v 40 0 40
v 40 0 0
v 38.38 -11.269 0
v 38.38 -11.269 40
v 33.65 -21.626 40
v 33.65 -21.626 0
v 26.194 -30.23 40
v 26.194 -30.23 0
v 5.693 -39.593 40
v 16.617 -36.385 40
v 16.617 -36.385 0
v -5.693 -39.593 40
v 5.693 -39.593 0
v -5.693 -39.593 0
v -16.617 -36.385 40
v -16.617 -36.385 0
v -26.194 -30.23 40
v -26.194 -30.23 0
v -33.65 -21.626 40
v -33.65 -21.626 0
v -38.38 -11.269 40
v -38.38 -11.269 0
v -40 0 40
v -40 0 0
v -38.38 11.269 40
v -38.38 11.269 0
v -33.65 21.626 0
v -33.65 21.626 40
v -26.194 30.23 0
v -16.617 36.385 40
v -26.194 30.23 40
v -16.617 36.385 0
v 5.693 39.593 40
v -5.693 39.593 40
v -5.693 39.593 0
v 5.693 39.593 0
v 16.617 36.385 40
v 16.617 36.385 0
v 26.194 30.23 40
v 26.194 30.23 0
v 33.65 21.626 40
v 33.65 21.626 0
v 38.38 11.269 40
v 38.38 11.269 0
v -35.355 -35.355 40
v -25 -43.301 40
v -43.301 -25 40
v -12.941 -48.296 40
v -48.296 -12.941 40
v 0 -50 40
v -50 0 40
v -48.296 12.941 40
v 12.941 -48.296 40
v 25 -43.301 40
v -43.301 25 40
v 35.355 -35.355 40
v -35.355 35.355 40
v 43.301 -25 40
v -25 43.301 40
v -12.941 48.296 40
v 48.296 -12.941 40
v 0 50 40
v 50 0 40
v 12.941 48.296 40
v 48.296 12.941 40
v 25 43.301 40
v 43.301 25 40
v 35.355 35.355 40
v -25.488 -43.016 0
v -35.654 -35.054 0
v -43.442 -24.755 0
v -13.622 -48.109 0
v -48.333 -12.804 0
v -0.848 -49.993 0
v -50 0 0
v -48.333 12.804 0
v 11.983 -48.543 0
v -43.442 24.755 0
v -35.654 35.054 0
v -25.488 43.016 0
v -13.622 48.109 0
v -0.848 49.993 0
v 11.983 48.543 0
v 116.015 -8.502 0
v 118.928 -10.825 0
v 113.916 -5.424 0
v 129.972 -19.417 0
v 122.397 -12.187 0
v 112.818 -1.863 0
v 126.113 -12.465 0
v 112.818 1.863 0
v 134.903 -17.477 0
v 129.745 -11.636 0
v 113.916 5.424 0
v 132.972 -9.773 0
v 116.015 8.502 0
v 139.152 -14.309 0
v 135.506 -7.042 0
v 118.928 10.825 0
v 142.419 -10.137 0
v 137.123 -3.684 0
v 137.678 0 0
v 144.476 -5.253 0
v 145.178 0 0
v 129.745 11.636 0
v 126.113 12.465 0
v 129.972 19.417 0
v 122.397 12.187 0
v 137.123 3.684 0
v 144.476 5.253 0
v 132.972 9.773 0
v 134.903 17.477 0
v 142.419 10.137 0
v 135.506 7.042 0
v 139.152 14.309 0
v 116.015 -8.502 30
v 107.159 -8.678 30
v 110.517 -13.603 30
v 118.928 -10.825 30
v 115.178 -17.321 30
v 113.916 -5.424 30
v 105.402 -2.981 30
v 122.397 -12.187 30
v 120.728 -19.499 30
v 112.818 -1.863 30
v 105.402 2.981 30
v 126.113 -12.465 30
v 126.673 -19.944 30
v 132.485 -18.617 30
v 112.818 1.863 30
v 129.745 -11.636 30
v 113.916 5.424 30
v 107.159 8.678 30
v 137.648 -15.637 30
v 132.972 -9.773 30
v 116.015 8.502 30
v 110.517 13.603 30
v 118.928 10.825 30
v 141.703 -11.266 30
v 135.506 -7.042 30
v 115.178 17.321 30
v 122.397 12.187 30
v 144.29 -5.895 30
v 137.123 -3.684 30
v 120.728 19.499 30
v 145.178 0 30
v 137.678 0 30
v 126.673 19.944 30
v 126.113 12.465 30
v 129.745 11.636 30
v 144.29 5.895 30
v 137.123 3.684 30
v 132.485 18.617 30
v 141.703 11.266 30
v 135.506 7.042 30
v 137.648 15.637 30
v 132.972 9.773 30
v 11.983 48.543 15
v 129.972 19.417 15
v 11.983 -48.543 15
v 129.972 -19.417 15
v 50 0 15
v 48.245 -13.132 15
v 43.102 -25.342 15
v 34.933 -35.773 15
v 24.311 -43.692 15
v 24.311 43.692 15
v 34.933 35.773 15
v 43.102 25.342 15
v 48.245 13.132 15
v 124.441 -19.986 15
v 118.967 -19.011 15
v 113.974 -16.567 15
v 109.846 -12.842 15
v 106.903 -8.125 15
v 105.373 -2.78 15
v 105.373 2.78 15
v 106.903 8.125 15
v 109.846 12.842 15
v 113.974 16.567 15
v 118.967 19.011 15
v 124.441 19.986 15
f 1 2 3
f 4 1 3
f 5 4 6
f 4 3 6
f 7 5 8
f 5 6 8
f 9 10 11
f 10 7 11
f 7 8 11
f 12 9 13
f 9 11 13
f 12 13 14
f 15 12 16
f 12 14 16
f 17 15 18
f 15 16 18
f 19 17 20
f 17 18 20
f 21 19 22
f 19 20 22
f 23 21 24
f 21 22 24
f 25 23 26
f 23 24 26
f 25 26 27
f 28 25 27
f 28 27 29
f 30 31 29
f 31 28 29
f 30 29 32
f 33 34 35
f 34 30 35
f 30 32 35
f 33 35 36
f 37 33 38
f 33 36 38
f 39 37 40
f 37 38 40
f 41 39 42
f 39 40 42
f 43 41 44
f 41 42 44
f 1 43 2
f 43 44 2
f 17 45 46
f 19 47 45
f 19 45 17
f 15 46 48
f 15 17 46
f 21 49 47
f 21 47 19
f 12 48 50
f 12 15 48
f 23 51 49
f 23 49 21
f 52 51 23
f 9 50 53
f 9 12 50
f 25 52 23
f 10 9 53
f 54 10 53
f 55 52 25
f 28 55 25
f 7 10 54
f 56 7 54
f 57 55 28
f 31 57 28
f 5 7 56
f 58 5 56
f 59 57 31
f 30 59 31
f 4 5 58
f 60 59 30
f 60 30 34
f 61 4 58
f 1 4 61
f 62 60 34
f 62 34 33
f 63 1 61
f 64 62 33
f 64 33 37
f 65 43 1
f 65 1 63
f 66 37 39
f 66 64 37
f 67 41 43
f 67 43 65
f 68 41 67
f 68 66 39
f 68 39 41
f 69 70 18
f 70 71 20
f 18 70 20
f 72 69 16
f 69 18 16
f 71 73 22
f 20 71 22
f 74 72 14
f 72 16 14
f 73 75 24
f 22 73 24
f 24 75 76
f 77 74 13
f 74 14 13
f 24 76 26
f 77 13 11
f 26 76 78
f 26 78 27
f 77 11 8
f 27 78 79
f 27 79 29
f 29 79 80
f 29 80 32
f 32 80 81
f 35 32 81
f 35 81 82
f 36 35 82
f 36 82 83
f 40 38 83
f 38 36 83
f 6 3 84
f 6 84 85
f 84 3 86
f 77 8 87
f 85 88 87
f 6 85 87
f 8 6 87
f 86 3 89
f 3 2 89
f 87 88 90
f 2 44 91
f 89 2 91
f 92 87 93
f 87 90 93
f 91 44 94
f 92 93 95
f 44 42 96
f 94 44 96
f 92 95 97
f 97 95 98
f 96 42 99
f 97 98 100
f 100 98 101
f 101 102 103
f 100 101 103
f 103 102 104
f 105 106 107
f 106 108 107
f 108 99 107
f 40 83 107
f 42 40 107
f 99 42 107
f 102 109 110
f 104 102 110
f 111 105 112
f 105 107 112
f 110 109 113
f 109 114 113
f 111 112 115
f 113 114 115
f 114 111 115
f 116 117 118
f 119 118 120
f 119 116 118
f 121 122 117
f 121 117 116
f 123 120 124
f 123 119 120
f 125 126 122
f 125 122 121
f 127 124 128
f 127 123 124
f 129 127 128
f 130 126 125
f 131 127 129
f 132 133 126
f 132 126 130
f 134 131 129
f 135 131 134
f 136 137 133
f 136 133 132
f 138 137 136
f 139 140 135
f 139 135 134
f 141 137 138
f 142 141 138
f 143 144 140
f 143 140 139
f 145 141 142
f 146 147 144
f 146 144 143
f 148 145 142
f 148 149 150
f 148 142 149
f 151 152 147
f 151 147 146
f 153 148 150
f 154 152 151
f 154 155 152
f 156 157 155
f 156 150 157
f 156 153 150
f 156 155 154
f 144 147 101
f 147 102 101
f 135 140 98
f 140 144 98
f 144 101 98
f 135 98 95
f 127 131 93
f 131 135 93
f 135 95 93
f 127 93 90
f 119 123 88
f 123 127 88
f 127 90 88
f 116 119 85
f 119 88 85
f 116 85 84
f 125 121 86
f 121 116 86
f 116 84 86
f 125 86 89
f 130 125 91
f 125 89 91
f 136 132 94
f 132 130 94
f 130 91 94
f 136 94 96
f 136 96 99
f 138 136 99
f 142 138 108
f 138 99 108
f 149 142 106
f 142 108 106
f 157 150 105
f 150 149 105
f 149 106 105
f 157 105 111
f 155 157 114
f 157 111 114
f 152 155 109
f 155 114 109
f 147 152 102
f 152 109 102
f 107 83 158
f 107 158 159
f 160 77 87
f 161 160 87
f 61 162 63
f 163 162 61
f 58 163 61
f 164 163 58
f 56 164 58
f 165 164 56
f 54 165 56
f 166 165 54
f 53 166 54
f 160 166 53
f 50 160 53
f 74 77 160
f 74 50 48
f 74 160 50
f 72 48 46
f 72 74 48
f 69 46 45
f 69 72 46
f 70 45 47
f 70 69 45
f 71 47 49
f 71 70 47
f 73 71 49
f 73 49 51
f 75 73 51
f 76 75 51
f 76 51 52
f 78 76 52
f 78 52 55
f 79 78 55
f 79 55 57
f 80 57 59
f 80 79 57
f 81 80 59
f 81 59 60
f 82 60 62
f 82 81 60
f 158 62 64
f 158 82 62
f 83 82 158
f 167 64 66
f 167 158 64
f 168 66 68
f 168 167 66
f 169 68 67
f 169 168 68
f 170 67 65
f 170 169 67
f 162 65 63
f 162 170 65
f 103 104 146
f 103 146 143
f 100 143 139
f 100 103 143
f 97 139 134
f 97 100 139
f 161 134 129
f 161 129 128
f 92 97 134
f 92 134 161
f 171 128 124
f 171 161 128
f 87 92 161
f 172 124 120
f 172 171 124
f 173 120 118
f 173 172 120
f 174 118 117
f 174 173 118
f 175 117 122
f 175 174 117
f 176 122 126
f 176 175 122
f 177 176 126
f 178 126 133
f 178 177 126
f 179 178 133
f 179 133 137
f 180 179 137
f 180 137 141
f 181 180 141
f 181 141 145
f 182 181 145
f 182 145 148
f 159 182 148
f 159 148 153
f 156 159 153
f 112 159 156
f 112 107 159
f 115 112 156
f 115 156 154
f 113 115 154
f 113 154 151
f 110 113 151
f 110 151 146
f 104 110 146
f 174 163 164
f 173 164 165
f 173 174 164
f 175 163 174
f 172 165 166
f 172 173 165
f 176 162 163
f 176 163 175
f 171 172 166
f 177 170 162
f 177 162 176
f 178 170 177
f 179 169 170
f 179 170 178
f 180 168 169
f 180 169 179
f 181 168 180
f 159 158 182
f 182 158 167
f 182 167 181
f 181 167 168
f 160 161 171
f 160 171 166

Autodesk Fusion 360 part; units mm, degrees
sketch "스케치1" plane through (0, 0, 0) normal (0, 0, 1) x (1, 0, 0)
  circle A0 centre (0, 0) radius 50
  circle A1 centre (125.1784, 0) radius 20
  line L0 (11.9829, 48.5429) -> (129.9716, 19.4171)
  line L1 (11.9829, -48.5429) -> (129.9716, -19.4171)
  circle A2 centre (0, 0) radius 40
  circle A3 centre (125.1784, 0) radius 12.5
  dimension "d1" = 100
  dimension "d2" = 40
  dimension "d3" = 80
  dimension "d4" = 25
extrude "돌출4" add sketch "스케치1" along normal blind 40 contours A0 makes body 1
extrude "돌출5" add sketch "스케치1" along normal blind 30 separate body contours A1 makes body 2
extrude "돌출6" add sketch "스케치1" along normal blind 15 contours A0 A1 L0 L1 bodies 1 2
